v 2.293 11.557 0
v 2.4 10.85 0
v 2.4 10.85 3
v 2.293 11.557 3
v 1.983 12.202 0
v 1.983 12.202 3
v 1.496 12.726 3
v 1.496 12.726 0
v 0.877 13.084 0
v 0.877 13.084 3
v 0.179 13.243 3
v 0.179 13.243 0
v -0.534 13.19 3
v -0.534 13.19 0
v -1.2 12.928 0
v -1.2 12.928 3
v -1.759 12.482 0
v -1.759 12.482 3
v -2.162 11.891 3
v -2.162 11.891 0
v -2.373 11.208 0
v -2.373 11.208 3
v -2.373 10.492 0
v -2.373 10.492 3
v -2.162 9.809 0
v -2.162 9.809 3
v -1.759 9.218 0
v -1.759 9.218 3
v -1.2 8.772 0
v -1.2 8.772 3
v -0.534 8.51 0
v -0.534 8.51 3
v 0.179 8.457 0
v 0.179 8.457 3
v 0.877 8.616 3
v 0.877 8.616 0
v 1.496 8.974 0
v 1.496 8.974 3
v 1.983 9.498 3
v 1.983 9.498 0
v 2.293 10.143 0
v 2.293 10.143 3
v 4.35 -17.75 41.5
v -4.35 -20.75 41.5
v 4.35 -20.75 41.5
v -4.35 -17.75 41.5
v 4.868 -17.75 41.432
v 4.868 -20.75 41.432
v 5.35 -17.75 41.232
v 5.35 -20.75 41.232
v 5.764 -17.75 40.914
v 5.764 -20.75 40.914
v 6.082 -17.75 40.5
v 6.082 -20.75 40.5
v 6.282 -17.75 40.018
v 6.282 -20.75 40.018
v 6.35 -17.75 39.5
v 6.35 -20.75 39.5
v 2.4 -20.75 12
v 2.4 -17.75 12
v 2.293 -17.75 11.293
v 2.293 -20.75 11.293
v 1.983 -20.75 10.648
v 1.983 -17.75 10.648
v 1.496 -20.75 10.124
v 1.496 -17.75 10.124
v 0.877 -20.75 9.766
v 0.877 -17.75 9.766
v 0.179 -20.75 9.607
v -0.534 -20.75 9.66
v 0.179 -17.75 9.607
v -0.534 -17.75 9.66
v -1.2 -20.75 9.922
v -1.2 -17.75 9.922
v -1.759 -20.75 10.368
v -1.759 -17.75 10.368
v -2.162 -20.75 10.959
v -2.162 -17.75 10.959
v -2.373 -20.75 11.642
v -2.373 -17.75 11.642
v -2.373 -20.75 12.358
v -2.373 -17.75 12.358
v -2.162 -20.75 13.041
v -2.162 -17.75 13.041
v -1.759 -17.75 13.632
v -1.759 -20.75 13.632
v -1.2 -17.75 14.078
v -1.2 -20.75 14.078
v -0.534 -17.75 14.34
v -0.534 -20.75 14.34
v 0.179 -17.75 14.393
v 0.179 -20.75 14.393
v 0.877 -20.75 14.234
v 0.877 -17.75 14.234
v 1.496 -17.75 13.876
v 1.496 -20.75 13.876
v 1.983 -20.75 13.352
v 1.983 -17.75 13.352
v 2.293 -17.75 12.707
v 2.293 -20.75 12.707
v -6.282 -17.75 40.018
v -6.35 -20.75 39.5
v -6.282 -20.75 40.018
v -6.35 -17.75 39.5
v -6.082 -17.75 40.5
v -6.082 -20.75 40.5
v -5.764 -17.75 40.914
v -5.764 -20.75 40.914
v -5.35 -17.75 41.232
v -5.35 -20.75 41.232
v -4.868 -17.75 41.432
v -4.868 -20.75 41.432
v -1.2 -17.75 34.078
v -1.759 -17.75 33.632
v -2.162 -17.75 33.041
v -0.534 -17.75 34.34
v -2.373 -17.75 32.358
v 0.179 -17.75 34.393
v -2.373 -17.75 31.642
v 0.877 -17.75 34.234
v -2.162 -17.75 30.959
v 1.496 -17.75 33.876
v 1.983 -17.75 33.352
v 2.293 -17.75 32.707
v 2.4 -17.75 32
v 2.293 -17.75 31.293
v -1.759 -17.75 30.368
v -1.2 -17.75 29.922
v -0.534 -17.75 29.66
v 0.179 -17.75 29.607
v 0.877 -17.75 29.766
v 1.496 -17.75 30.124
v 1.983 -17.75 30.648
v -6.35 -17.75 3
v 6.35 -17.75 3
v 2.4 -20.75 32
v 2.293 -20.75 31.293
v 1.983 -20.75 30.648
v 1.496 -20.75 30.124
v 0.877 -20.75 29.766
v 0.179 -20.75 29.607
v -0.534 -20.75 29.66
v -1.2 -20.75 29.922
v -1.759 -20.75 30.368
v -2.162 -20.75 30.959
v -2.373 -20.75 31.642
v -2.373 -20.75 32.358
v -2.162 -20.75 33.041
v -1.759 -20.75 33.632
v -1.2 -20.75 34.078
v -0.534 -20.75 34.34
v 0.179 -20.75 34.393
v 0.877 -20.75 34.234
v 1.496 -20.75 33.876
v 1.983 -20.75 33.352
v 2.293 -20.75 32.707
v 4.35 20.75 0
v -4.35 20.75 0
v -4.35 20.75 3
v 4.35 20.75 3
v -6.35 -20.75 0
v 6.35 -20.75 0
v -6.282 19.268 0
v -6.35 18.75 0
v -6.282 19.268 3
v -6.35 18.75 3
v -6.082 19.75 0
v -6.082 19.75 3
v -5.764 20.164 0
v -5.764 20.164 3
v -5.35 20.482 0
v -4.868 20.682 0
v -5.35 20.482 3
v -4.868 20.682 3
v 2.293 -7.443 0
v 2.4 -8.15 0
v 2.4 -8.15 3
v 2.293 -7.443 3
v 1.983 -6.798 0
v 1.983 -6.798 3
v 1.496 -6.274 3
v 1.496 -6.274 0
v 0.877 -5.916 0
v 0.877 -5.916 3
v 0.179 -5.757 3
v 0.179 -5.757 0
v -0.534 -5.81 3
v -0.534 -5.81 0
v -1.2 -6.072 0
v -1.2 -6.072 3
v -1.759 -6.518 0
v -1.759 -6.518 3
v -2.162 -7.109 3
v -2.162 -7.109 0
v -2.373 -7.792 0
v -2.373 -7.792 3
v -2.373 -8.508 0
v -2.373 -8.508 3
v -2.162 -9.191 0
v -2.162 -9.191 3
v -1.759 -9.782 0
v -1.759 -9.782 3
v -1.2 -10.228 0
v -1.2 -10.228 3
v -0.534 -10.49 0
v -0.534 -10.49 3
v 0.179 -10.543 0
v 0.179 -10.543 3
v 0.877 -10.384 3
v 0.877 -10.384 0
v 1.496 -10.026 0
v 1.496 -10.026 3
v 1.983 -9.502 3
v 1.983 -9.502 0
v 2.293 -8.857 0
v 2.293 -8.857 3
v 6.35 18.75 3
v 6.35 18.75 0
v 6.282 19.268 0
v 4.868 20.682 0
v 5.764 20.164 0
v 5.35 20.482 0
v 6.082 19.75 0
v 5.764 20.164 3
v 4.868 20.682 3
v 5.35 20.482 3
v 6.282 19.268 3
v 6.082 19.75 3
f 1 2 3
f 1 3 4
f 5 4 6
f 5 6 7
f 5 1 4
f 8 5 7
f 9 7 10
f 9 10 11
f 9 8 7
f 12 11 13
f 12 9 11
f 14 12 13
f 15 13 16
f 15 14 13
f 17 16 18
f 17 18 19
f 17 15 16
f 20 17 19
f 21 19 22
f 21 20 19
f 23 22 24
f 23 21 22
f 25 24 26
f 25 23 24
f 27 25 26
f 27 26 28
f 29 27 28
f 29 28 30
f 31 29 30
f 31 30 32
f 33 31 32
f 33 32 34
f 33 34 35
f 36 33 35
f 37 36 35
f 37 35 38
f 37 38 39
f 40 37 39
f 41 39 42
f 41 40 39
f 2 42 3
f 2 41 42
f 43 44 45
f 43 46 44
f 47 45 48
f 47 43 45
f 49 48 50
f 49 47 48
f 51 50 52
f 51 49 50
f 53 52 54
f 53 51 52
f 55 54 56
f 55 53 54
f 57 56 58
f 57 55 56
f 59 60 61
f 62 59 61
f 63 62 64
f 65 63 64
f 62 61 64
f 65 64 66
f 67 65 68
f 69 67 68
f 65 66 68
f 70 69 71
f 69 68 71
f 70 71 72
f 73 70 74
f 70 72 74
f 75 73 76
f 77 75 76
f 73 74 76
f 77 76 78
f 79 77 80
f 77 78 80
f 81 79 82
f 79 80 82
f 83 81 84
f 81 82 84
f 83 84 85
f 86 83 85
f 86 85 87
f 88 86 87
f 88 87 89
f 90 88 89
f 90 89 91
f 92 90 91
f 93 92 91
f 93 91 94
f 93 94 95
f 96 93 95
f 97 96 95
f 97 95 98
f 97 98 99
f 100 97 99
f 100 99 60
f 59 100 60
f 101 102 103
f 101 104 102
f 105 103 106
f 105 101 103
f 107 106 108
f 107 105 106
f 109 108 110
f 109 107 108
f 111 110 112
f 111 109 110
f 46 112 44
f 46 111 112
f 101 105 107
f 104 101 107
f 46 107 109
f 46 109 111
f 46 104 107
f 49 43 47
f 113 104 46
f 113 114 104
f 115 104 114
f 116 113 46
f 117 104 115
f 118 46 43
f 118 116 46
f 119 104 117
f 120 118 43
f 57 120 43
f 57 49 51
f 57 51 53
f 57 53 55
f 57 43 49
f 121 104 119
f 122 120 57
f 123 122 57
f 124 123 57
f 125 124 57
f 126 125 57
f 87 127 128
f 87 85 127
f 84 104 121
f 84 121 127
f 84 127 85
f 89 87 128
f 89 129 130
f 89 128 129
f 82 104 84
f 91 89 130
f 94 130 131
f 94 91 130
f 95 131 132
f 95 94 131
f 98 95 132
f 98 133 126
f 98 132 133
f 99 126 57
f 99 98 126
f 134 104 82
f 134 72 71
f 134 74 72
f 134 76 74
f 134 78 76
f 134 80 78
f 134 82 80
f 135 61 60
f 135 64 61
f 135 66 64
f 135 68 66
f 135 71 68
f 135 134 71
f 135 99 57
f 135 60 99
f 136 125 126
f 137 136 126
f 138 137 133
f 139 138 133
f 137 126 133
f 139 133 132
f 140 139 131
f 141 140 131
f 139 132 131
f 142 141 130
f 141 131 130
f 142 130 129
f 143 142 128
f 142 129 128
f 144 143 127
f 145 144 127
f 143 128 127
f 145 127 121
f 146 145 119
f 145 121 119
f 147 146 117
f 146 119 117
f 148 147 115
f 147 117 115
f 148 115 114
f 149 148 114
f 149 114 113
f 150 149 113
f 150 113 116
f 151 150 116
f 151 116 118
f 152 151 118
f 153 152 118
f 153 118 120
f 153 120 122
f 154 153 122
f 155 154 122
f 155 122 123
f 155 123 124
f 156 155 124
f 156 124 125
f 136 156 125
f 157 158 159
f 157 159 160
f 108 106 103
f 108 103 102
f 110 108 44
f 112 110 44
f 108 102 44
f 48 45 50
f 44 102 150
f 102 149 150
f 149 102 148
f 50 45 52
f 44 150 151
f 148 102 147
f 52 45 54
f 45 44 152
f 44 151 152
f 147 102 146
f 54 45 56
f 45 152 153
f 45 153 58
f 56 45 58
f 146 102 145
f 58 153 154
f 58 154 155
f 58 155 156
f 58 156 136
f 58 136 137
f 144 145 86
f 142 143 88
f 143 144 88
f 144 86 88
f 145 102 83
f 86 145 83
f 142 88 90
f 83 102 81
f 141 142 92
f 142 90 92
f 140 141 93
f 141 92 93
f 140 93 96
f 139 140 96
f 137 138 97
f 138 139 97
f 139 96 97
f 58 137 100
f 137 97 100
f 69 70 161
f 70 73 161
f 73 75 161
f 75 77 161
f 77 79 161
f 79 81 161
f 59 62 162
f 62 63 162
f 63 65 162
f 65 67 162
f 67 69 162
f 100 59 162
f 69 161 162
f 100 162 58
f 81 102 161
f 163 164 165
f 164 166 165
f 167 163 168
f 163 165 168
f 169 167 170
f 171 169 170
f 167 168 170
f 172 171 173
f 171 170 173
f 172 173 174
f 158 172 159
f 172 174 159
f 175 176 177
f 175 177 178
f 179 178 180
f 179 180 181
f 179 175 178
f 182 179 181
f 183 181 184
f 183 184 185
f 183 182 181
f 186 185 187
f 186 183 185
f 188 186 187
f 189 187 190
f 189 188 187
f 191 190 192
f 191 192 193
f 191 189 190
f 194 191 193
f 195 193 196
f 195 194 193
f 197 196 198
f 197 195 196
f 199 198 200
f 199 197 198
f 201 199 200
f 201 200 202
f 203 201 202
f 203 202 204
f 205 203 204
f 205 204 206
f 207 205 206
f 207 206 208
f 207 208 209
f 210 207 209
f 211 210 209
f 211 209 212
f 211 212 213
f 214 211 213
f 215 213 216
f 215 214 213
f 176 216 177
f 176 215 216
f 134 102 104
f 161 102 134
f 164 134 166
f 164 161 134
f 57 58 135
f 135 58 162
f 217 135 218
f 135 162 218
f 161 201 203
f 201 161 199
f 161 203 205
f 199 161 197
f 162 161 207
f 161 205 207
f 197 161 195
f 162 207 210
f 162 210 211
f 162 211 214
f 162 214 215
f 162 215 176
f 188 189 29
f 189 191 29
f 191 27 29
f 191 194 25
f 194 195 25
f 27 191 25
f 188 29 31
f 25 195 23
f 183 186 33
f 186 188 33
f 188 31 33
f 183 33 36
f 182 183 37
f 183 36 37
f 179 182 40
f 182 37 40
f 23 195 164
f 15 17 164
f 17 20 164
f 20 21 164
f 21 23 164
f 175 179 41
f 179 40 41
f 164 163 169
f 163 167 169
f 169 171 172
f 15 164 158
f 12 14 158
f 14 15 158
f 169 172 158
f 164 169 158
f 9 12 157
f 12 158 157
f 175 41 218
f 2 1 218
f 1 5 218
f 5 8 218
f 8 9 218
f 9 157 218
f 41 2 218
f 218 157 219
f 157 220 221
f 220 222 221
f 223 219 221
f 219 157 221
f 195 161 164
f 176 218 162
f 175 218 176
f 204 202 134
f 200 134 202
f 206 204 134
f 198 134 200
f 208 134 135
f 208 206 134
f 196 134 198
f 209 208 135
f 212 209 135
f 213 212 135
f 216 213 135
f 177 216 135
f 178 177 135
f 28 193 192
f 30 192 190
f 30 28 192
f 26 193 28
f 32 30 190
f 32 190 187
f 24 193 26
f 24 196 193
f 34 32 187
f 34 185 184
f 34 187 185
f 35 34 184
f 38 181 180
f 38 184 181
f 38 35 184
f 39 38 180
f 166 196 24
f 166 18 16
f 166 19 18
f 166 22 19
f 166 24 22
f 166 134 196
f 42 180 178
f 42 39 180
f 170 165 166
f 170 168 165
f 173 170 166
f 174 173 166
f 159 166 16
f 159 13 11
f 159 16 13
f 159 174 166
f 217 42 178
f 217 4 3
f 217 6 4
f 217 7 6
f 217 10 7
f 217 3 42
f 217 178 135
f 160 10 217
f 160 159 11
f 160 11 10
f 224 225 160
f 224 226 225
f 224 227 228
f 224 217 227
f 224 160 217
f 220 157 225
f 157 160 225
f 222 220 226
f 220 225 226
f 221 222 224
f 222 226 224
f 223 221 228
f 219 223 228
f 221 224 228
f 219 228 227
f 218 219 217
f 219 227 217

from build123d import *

# Parameters (mm, degrees)
ESBO_O1_W                = 12.7
ESBO_O1_H                = 41.5
ESBO_O1_R                = 2.4
RESSALTO_EXTRUS_O1_DEPTH = 3
ESBO_O2_W                = 12.7
ESBO_O2_H                = 3
RESSALTO_EXTRUS_O2_DEPTH = 38.5
ESBO_O3_R                = 2.4
CORTE_EXTRUS_O1_DEPTH    = 41.5
FILETE1_R                = 2


with BuildPart() as part:
    # Esboço1 → Ressalto-extrusão1 (new body)
    with BuildSketch(Plane.XY):
        Rectangle(ESBO_O1_W, ESBO_O1_H)
        with Locations((0, 10.85)):
            Circle(ESBO_O1_R, mode=Mode.SUBTRACT)
        with Locations((0, -8.15)):
            Circle(ESBO_O1_R, mode=Mode.SUBTRACT)
    extrude(amount=RESSALTO_EXTRUS_O1_DEPTH)

    # Esboço2 → Ressalto-extrusão2 (add)
    with BuildSketch(Plane.XY.offset(3)):
        with Locations((0, -19.25)):
            Rectangle(ESBO_O2_W, ESBO_O2_H)
    extrude(amount=RESSALTO_EXTRUS_O2_DEPTH)

    # Esboço3 → Corte-extrusão1 (cut)
    with BuildSketch(Plane(origin=(0, -17.75, 0), x_dir=(1, 0, 0), z_dir=(0, 1, 0))):
        with Locations((0, -12)):
            Circle(ESBO_O3_R)
        with Locations((0, -32)):
            Circle(ESBO_O3_R)
    extrude(amount=-CORTE_EXTRUS_O1_DEPTH, mode=Mode.SUBTRACT)

    # Filete1
    filete1_edges = [part.edges().sort_by_distance(p)[0] for p in [
        (6.35, -19.25, 41.5),
        (-6.35, -19.25, 41.5),
        (-6.35, 20.75, 1.5),
        (6.35, 20.75, 1.5),
    ]]
    fillet(filete1_edges, radius=FILETE1_R)


solid = part.part
